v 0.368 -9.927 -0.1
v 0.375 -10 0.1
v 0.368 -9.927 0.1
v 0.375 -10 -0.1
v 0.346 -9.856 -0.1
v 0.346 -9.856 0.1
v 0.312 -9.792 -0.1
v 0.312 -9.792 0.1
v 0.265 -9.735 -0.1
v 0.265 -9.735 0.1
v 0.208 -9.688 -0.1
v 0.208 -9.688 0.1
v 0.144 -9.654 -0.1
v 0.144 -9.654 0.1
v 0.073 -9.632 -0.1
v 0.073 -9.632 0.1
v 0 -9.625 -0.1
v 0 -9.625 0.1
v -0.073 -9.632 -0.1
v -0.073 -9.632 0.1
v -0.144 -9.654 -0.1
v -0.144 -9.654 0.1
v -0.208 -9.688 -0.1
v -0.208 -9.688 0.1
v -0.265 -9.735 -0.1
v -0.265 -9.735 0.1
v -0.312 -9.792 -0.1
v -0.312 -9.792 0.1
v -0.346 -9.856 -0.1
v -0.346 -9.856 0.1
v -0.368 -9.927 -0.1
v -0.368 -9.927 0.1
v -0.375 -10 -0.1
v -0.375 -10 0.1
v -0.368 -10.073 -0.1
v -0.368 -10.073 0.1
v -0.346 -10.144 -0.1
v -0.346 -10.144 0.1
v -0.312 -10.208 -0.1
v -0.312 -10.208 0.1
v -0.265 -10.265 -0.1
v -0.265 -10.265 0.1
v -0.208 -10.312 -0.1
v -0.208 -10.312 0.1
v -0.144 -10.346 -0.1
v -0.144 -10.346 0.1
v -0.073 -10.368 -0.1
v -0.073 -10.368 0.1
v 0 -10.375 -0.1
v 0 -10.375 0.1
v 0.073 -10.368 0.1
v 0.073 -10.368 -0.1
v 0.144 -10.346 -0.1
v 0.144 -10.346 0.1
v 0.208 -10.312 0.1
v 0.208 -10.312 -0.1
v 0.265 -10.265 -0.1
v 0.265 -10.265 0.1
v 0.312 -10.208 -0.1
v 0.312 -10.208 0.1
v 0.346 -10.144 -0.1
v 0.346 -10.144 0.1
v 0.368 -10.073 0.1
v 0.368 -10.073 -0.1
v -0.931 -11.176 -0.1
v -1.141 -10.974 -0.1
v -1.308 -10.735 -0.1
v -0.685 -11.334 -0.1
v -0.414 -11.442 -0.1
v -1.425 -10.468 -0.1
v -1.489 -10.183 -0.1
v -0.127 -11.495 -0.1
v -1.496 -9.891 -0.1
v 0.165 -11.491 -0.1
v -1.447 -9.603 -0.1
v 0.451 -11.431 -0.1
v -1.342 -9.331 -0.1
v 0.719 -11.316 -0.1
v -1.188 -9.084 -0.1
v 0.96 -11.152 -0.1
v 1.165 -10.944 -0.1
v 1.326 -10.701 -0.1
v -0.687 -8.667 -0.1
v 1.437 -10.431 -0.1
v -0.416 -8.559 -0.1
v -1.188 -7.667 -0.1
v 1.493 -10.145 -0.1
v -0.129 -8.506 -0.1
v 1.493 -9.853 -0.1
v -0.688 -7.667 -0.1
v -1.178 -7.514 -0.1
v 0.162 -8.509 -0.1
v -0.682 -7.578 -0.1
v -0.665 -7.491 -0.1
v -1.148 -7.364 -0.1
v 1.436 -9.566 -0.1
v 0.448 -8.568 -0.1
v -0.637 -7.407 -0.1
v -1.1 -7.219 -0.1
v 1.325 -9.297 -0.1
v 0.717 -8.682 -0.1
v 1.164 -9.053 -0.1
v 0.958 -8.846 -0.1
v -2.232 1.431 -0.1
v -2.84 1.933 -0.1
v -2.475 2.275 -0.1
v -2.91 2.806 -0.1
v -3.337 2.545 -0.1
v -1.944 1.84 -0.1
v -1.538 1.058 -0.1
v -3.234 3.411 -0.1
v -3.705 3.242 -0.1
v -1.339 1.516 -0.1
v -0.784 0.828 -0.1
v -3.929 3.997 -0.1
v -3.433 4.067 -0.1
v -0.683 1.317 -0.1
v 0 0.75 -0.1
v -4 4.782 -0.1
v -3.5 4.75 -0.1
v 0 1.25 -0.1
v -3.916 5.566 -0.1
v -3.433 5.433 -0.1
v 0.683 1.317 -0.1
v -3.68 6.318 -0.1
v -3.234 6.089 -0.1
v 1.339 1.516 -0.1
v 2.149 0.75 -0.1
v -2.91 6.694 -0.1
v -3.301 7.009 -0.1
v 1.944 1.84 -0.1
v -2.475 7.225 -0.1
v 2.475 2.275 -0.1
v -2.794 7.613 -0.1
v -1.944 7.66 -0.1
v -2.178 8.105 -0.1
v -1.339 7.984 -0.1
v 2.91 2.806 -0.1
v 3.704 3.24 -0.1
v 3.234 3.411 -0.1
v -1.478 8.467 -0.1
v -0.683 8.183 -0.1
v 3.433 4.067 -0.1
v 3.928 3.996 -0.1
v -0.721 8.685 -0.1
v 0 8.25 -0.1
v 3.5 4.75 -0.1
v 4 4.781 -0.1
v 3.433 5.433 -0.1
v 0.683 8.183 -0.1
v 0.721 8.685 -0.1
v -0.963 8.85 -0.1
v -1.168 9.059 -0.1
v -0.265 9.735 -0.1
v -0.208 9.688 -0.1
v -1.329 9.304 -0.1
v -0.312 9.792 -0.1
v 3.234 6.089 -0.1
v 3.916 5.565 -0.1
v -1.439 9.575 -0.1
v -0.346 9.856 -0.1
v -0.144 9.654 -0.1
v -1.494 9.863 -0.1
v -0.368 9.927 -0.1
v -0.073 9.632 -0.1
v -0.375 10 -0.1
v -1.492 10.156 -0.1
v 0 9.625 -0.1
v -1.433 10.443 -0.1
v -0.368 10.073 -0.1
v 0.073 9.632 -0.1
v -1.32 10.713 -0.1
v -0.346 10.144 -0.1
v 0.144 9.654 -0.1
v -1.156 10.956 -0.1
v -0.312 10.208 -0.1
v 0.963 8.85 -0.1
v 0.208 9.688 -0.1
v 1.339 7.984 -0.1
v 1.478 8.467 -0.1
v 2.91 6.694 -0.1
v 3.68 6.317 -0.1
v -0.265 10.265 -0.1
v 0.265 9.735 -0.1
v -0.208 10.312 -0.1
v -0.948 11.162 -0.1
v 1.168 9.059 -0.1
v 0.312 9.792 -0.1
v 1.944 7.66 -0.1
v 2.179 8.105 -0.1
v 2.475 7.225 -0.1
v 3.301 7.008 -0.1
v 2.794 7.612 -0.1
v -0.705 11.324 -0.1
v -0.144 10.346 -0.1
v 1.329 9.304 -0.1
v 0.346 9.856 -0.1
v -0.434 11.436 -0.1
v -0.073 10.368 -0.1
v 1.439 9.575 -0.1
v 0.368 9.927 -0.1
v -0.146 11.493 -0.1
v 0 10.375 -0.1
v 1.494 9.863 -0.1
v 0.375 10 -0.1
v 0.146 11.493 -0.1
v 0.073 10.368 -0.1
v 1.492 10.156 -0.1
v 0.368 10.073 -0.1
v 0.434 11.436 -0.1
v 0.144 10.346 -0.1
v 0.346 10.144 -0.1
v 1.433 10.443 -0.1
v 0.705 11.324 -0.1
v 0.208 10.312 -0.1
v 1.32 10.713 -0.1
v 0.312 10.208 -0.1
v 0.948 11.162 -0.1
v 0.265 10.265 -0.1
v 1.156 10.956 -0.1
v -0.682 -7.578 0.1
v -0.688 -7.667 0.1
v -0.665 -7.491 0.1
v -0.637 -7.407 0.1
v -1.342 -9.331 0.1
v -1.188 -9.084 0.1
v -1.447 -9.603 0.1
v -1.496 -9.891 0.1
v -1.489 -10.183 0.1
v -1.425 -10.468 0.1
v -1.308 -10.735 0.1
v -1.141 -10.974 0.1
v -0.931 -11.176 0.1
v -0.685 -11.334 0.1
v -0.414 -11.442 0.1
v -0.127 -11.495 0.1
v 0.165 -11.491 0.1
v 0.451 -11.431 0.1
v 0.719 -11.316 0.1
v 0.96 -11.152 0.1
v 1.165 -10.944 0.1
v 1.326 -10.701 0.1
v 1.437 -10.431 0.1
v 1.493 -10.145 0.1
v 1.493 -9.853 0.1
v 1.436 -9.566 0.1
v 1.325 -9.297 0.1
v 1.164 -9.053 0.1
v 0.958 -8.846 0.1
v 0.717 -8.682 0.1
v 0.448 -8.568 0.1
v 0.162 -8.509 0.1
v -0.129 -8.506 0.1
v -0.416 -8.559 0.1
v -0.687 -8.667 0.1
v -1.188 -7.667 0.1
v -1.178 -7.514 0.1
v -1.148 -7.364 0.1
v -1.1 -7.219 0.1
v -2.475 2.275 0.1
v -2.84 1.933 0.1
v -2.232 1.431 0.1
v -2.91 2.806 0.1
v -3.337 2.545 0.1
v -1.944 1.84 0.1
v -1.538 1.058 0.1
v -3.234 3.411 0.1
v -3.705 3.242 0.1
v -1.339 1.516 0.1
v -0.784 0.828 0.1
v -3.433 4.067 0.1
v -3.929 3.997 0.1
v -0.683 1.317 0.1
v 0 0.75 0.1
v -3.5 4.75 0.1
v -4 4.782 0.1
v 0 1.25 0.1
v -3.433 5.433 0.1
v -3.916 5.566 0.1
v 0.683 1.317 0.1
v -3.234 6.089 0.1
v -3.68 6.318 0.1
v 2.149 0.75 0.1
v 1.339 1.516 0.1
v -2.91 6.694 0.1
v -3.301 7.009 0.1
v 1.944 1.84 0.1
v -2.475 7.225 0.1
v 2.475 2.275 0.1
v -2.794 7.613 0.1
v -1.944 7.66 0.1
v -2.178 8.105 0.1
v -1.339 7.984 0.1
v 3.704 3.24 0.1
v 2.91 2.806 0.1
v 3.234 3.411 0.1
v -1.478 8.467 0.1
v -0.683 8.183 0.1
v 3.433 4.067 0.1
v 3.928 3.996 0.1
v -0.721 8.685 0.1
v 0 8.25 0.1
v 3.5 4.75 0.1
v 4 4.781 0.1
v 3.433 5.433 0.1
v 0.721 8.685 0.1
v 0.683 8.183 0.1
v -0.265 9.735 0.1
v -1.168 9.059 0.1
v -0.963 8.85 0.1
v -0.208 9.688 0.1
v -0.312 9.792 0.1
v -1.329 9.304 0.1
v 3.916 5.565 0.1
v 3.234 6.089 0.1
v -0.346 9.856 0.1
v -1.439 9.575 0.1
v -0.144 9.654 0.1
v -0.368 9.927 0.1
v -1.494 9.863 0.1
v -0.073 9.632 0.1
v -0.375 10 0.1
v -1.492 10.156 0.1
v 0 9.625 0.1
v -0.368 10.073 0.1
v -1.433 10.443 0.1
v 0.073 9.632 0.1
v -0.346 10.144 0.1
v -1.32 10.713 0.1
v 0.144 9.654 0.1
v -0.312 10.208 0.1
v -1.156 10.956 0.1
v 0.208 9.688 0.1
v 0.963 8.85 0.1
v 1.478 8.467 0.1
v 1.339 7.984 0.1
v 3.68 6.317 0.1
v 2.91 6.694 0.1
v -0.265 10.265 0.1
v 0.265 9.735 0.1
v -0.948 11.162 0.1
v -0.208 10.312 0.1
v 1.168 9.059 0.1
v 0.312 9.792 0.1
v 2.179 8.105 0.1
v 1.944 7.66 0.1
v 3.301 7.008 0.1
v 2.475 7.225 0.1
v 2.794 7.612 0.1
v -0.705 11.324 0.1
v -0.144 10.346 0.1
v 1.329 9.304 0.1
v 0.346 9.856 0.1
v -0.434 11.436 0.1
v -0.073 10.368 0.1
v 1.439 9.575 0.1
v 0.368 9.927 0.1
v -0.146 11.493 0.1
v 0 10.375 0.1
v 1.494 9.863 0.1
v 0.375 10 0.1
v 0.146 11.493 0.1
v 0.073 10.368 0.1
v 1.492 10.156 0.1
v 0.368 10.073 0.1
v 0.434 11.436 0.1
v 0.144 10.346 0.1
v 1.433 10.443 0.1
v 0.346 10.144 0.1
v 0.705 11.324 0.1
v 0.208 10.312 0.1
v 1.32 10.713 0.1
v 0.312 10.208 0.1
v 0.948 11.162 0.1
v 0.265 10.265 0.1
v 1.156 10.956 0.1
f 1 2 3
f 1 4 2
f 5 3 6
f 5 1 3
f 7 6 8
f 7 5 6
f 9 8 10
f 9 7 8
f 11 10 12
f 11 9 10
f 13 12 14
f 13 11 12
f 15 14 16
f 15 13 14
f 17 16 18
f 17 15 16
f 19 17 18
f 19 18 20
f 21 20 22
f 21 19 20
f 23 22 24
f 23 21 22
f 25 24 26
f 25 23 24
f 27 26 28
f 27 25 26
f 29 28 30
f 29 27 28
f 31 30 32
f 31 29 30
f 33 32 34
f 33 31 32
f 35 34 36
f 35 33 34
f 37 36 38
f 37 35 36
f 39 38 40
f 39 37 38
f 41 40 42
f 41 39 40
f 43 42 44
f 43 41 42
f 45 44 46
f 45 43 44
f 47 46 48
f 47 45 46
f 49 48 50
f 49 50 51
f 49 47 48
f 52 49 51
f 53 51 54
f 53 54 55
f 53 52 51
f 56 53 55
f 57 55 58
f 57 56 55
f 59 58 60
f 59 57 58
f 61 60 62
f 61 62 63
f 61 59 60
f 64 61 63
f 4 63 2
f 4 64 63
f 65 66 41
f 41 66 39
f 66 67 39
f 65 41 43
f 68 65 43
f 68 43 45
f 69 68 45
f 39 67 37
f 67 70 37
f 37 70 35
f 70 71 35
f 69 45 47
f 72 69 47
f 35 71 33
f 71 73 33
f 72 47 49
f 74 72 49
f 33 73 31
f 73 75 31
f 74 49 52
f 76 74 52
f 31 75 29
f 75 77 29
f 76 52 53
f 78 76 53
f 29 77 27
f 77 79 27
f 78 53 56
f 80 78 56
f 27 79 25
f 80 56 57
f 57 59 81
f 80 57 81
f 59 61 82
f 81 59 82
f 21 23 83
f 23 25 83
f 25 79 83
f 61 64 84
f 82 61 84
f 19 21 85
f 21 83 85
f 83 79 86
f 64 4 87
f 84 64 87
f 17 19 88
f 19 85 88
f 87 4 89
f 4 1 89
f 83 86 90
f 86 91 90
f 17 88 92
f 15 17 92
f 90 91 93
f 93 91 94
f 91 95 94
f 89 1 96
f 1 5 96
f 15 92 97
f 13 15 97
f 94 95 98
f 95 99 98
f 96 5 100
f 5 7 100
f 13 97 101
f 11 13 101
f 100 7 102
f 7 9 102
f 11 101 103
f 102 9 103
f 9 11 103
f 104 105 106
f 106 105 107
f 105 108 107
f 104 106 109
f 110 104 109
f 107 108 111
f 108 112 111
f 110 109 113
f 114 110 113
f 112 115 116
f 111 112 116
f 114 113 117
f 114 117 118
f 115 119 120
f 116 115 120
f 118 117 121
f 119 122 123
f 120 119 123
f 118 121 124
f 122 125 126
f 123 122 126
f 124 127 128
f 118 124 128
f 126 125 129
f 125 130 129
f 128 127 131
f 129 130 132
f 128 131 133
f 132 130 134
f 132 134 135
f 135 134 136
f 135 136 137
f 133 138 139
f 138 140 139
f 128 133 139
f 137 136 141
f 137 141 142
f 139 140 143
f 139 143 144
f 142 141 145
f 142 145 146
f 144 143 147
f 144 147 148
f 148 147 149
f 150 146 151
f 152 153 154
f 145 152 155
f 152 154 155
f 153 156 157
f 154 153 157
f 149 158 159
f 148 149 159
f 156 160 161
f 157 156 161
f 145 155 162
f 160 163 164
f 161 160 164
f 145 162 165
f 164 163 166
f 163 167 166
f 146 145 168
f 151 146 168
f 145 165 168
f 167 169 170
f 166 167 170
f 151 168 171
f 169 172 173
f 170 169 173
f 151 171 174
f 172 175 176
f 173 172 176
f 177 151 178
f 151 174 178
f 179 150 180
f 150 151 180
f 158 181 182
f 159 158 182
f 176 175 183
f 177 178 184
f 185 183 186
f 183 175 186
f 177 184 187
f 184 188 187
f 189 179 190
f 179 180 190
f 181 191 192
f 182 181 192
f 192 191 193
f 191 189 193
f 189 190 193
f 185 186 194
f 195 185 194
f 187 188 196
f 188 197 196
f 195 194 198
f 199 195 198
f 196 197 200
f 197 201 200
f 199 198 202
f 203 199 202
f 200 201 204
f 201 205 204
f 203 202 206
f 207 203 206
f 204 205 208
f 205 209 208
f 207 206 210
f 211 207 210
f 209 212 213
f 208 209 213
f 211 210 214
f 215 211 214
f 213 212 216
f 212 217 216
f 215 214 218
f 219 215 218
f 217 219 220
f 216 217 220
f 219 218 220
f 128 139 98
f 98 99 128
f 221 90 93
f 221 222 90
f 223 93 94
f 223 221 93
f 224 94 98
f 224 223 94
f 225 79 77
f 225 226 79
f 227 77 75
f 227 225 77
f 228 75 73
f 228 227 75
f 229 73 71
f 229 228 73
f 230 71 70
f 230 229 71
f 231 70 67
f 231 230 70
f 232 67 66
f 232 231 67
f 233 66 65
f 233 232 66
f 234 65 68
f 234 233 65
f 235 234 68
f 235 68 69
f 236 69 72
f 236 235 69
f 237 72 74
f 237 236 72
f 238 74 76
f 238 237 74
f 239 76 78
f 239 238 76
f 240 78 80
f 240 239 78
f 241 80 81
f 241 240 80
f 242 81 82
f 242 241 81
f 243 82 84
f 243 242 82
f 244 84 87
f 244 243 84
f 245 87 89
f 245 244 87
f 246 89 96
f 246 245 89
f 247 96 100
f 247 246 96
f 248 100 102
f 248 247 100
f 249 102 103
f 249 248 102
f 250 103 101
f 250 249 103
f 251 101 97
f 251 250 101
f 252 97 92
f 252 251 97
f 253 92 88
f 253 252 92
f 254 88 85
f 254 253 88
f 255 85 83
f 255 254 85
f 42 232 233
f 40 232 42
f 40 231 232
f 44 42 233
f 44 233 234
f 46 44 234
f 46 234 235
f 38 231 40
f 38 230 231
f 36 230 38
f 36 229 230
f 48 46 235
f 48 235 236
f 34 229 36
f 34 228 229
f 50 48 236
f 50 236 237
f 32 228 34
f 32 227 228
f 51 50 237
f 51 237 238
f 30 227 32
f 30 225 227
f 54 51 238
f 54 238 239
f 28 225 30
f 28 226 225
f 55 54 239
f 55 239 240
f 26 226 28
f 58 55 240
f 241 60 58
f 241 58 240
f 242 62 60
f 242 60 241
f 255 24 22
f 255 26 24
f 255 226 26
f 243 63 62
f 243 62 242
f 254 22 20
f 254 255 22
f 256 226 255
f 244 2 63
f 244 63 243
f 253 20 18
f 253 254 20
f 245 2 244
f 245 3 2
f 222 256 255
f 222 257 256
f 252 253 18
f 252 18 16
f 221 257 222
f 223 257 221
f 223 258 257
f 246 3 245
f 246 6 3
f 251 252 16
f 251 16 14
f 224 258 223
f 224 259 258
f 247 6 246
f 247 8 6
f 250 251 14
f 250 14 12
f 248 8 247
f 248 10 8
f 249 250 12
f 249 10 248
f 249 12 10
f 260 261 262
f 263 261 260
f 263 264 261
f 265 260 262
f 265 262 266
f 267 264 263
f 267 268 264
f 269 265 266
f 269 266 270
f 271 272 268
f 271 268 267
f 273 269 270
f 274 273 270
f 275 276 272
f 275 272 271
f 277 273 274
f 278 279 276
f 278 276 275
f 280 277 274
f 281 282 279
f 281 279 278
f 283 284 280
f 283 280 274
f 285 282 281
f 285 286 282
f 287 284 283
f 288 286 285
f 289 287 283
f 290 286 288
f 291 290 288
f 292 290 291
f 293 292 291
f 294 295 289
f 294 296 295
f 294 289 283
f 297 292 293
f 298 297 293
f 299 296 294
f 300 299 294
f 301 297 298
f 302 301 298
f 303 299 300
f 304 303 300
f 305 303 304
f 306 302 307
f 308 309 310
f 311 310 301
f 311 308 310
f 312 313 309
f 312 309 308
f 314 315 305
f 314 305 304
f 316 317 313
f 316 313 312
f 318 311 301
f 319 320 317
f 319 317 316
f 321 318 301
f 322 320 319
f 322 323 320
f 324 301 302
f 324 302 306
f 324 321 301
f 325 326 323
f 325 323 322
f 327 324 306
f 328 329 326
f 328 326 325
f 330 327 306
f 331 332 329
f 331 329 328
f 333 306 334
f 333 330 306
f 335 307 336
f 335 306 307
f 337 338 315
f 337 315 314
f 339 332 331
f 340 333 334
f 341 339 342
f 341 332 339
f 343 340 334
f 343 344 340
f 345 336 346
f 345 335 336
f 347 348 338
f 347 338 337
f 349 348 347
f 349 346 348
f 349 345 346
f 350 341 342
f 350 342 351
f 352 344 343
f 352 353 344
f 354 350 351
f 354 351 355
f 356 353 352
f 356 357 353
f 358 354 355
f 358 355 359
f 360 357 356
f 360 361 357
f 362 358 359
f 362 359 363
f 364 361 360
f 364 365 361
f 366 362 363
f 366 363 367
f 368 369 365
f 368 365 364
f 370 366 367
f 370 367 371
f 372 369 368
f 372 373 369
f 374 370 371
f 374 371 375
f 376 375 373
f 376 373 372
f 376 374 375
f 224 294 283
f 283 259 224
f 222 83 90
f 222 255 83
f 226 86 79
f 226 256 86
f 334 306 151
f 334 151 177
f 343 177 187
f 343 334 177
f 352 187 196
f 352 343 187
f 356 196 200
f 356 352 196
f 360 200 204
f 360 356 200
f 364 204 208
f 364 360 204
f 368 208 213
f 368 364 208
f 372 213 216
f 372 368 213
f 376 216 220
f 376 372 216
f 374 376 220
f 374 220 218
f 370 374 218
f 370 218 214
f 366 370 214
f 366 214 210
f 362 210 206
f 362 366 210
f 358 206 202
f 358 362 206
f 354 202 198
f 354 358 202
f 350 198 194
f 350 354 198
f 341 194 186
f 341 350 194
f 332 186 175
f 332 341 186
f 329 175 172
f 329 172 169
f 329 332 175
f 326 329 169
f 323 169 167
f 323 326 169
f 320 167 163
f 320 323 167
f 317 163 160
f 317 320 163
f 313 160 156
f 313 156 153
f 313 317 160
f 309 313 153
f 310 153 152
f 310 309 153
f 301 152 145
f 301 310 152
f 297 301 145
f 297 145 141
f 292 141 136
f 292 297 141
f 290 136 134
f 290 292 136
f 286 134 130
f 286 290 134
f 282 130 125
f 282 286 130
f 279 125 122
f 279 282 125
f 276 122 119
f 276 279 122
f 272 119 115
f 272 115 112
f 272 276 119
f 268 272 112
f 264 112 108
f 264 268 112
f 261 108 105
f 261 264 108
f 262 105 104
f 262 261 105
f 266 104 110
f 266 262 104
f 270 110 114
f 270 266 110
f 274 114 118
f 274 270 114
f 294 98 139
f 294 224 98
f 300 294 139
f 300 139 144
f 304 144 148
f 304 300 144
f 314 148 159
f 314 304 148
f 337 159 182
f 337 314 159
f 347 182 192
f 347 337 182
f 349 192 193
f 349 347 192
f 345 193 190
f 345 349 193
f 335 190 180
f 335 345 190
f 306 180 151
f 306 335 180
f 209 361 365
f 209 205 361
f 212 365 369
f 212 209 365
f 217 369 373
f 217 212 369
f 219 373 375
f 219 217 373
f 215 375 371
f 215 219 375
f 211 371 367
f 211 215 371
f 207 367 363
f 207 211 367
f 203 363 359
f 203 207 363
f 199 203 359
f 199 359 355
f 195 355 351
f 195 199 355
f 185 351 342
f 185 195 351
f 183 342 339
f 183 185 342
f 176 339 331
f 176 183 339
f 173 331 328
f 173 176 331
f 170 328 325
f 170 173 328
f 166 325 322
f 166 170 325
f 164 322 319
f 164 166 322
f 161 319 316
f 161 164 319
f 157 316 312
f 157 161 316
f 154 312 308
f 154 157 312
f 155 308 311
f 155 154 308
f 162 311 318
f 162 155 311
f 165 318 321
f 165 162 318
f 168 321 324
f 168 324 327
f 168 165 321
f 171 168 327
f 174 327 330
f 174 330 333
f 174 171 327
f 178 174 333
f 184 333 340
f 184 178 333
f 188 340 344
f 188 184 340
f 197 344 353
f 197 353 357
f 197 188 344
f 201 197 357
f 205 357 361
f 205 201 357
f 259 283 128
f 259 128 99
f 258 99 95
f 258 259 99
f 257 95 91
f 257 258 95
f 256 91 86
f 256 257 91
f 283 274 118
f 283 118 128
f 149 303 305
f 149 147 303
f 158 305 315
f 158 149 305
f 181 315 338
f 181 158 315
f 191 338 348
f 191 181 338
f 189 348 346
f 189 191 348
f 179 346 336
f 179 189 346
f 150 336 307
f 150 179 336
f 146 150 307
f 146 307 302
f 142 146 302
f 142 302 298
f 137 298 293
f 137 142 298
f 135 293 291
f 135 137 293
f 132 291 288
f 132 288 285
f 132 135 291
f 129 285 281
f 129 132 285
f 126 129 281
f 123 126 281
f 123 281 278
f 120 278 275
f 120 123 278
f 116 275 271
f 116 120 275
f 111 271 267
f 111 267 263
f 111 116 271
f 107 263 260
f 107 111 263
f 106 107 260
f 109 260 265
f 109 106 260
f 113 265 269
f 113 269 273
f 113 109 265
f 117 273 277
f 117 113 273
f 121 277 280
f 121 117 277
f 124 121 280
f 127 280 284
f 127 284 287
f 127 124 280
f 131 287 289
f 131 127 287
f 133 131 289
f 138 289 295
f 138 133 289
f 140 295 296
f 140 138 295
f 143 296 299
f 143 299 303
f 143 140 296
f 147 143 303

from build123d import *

# Parameters (mm, degrees)
SKETCH1_R           = 0.375
SKETCH1_R_2         = 3.5
BOSS_EXTRUDE1_DEPTH = 0.1


with BuildPart() as part:
    # Sketch1 → Boss-Extrude1 (new body, symmetric)
    with BuildSketch(Plane.XY):
        with BuildLine():
            Line((-0.636628274, -7.407290054), (3.704019046, 3.239952681))
            ThreePointArc((3.704019046, 3.239952681), (3.507926477, 6.672095687), (0.720779018, 8.68452381))
            ThreePointArc((0.720779018, 8.68452381), (0, 11.5), (-0.720779018, 8.68452381))
            ThreePointArc((-0.720779018, 8.68452381), (-3.983597321, 4.388126568), (0, 0.75))
            Line((0, 0.75), (2.148965927, 0.75))
            Line((2.148965927, 0.75), (-1.099630654, -7.218534139))
            ThreePointArc((-1.099630654, -7.218534139), (-1.165325631, -7.4384166), (-1.1875, -7.666829437))
            Line((-1.1875, -7.666829437), (-1.1875, -9.083570106))
            ThreePointArc((-1.1875, -9.083570106), (0.960377242, -11.152248043), (-0.6875, -8.666829437))
            Line((-0.6875, -8.666829437), (-0.6875, -7.666829437))
            ThreePointArc((-0.6875, -7.666829437), (-0.674662207, -7.534590426), (-0.636628274, -7.407290054))
        make_face()
        with Locations((0, -10)):
            Circle(SKETCH1_R, mode=Mode.SUBTRACT)
        with Locations((0, 10)):
            Circle(SKETCH1_R, mode=Mode.SUBTRACT)
        with Locations((0, 4.75)):
            Circle(SKETCH1_R_2, mode=Mode.SUBTRACT)
    extrude(amount=BOSS_EXTRUDE1_DEPTH, both=True)


solid = part.part
